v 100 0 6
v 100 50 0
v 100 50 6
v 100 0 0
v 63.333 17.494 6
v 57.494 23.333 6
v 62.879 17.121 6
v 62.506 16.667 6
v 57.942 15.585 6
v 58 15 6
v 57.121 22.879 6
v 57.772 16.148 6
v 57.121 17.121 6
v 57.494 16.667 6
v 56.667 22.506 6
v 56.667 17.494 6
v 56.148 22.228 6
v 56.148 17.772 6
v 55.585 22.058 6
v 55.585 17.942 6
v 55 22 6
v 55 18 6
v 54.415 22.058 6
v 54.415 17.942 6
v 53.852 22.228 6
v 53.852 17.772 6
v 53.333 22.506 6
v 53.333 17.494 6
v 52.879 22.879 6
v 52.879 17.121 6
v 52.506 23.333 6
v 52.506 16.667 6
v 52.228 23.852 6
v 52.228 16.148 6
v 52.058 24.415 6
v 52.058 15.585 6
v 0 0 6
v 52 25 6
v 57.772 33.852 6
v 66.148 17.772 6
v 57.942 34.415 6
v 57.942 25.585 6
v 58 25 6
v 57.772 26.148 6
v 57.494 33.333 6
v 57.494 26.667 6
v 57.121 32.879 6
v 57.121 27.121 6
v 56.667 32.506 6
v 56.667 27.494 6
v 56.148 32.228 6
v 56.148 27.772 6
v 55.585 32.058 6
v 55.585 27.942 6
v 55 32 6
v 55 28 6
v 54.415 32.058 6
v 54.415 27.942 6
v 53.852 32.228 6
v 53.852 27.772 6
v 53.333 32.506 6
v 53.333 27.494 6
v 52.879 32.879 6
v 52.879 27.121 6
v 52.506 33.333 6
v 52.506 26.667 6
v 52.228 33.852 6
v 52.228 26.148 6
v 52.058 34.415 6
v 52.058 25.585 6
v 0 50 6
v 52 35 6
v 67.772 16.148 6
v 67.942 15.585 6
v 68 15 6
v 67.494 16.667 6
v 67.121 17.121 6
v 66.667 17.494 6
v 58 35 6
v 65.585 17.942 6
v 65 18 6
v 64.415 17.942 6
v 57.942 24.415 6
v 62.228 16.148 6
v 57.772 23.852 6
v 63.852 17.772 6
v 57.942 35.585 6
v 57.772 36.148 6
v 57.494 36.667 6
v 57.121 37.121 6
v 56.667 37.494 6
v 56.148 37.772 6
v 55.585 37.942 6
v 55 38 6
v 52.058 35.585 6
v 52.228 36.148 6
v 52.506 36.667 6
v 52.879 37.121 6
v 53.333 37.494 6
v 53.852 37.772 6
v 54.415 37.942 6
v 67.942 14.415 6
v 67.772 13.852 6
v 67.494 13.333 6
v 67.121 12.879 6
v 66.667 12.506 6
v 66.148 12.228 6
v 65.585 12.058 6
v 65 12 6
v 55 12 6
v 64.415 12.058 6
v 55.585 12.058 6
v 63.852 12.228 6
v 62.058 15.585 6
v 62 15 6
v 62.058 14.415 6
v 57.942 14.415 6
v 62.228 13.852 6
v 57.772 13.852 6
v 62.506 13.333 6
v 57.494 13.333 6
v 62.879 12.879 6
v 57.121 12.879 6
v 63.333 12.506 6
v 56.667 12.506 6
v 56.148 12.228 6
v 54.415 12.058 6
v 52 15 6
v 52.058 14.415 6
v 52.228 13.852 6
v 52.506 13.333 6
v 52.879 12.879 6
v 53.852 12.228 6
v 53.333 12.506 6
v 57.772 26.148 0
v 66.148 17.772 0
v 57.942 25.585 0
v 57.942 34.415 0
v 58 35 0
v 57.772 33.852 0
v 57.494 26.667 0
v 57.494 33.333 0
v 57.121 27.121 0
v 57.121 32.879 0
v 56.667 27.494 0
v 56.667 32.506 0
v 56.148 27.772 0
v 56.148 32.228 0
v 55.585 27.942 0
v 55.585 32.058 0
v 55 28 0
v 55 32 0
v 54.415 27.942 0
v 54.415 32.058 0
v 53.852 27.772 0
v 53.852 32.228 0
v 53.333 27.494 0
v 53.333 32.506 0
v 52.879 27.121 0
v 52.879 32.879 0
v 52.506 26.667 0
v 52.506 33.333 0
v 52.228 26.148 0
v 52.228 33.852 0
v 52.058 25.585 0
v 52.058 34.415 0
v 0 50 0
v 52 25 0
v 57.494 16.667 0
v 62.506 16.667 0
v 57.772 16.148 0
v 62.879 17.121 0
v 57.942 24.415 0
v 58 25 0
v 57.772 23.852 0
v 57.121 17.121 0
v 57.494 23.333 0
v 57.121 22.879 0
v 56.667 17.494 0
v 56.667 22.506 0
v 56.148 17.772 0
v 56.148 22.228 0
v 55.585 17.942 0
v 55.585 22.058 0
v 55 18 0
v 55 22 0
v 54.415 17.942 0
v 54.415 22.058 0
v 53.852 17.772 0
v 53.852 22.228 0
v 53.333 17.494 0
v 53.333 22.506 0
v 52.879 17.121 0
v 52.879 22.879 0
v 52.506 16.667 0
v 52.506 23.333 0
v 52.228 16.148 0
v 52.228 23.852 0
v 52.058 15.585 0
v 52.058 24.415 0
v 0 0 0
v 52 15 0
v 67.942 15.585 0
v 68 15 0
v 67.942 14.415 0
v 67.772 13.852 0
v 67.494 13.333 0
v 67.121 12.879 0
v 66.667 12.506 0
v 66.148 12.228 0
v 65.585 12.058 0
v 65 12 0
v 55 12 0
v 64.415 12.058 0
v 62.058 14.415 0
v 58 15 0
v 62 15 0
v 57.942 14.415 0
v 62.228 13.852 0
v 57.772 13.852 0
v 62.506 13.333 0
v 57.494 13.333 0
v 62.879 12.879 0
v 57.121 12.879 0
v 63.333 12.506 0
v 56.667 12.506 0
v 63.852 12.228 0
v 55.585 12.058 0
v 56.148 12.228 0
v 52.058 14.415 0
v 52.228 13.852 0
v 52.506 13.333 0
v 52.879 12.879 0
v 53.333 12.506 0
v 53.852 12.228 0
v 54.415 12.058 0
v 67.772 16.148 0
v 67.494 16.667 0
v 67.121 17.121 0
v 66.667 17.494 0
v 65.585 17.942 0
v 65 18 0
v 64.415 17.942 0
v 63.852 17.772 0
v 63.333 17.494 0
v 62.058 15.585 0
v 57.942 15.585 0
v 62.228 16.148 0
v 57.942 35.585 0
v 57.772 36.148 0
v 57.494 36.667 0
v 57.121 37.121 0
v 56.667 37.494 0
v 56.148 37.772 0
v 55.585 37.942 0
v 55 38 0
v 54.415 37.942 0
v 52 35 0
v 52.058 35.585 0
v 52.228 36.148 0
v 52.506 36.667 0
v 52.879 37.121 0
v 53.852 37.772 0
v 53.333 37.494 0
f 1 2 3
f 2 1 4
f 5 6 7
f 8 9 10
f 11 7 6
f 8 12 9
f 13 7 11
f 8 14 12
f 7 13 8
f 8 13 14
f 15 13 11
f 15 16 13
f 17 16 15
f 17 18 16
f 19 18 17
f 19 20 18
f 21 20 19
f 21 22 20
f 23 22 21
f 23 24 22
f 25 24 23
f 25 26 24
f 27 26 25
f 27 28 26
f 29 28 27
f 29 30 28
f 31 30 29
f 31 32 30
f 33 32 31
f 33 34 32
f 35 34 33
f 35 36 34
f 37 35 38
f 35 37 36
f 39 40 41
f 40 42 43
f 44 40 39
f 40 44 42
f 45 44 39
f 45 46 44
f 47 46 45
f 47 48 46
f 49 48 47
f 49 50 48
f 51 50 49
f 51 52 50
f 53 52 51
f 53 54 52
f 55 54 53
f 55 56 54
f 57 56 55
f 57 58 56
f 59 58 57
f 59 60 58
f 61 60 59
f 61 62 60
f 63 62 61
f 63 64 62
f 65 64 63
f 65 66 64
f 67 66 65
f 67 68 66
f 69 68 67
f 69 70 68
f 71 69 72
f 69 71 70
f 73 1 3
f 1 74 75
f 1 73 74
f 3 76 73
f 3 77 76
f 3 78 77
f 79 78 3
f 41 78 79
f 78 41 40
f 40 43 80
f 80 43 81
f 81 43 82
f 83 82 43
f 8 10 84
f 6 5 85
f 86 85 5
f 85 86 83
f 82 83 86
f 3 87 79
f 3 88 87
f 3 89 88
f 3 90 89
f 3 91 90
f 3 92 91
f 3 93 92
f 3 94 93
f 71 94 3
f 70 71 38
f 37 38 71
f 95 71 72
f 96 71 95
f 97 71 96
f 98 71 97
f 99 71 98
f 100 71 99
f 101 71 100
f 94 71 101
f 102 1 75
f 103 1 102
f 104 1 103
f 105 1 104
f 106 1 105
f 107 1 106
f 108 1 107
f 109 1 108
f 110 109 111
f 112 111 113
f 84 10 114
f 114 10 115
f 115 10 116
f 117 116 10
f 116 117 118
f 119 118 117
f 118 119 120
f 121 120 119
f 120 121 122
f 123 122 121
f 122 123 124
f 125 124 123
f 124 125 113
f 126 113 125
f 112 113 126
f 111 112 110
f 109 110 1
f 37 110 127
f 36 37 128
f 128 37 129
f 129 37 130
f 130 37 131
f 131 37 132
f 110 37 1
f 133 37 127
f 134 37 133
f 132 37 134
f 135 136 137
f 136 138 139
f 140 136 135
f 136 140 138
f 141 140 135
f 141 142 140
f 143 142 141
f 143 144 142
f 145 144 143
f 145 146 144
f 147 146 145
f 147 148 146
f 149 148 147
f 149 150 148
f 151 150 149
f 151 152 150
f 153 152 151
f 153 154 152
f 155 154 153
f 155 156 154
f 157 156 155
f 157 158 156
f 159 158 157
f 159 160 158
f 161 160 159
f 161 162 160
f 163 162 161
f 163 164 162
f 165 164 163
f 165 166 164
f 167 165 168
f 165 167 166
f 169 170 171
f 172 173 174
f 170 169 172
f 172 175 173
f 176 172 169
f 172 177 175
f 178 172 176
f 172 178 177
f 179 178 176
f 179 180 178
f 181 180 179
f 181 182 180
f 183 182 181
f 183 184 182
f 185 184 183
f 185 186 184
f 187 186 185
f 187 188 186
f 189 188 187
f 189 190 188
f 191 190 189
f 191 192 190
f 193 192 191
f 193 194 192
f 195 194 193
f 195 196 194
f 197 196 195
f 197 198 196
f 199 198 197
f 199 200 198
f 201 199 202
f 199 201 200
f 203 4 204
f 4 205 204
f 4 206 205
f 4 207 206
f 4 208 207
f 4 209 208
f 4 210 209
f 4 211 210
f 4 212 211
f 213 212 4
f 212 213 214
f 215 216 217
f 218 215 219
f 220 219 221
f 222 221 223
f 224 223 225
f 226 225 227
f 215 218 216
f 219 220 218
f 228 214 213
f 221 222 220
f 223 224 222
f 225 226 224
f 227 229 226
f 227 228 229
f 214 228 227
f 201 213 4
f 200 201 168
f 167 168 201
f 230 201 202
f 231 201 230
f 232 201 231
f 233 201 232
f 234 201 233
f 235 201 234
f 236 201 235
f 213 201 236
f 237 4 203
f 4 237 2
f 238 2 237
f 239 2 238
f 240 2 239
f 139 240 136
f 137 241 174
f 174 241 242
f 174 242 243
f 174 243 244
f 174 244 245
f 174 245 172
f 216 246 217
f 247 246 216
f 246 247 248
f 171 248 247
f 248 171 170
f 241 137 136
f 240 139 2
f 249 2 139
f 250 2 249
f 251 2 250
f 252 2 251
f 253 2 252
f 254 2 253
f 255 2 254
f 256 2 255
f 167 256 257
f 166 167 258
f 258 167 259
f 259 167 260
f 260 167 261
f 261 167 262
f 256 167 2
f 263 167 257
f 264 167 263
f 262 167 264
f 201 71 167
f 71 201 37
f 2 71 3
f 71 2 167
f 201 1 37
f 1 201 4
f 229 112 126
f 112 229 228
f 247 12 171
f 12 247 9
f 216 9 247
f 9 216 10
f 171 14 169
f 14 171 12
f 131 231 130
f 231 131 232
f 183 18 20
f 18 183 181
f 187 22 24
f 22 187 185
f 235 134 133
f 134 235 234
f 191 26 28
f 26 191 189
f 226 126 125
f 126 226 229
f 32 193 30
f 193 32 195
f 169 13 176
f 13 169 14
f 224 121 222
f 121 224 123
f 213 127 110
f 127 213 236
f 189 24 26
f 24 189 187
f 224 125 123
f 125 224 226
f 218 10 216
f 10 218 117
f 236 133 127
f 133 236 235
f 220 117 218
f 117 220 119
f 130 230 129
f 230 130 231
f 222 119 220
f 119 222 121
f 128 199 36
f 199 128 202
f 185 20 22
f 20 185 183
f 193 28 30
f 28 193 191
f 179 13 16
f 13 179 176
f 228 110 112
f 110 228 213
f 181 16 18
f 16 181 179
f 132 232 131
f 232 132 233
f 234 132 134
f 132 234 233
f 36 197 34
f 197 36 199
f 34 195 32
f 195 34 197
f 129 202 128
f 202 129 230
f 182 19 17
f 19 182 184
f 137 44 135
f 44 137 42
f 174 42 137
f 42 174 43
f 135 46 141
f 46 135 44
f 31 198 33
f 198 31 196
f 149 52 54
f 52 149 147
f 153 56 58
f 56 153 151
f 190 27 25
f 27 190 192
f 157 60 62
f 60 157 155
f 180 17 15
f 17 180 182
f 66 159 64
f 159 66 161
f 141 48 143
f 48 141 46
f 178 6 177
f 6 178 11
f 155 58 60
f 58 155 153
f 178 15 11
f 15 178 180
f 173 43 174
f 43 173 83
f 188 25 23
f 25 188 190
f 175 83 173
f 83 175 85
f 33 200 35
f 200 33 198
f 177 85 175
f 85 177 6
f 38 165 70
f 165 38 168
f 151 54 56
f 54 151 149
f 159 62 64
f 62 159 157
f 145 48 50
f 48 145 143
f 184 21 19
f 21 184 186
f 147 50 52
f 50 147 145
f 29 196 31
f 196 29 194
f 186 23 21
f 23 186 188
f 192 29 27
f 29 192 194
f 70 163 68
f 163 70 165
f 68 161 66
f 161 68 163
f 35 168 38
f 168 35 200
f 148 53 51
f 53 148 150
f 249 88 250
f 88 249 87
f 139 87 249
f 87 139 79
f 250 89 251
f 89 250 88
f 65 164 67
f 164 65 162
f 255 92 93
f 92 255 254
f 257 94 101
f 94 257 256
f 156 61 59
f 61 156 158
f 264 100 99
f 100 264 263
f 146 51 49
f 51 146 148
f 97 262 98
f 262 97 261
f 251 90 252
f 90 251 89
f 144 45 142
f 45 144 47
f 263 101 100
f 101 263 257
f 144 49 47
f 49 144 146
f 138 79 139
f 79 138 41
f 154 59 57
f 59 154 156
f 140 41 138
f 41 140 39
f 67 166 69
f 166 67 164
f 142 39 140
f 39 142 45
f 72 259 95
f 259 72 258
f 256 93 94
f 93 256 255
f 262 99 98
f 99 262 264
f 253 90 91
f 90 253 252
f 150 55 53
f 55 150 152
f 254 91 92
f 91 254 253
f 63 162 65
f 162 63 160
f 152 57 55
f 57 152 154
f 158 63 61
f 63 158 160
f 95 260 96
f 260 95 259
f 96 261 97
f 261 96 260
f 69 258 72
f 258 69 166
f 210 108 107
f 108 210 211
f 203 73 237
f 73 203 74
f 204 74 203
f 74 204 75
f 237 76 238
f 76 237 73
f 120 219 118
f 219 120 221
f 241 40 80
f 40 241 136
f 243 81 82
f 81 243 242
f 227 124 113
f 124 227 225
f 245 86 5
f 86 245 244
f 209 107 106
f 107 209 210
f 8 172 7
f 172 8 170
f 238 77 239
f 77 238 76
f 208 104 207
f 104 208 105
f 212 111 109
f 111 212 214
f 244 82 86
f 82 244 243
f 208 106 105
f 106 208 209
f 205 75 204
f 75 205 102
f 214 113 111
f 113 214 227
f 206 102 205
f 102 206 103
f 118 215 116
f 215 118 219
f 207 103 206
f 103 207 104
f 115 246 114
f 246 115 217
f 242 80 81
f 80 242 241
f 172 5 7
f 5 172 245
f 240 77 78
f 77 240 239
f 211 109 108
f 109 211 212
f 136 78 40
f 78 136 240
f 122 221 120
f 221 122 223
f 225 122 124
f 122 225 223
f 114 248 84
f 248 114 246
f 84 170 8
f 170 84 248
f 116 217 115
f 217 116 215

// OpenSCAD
$fn = 32;

// ----------------------------------------------------------------------
// Hole field: plate with holes at given coordinates
// ----------------------------------------------------------------------

// --- parameters (mm) ---
plate_l = 100;            // plate length, X
plate_w = 50;             // plate width, Y
plate_t = 6;              // plate thickness, Z
hole_d = 6;               // hole diameter

difference() {
  cube([plate_l, plate_w, plate_t]);
  translate([55, 15, -1]) cylinder(h = plate_t + 2, d = hole_d);
  translate([55, 25, -1]) cylinder(h = plate_t + 2, d = hole_d);
  translate([55, 35, -1]) cylinder(h = plate_t + 2, d = hole_d);
  translate([65, 15, -1]) cylinder(h = plate_t + 2, d = hole_d);
}
